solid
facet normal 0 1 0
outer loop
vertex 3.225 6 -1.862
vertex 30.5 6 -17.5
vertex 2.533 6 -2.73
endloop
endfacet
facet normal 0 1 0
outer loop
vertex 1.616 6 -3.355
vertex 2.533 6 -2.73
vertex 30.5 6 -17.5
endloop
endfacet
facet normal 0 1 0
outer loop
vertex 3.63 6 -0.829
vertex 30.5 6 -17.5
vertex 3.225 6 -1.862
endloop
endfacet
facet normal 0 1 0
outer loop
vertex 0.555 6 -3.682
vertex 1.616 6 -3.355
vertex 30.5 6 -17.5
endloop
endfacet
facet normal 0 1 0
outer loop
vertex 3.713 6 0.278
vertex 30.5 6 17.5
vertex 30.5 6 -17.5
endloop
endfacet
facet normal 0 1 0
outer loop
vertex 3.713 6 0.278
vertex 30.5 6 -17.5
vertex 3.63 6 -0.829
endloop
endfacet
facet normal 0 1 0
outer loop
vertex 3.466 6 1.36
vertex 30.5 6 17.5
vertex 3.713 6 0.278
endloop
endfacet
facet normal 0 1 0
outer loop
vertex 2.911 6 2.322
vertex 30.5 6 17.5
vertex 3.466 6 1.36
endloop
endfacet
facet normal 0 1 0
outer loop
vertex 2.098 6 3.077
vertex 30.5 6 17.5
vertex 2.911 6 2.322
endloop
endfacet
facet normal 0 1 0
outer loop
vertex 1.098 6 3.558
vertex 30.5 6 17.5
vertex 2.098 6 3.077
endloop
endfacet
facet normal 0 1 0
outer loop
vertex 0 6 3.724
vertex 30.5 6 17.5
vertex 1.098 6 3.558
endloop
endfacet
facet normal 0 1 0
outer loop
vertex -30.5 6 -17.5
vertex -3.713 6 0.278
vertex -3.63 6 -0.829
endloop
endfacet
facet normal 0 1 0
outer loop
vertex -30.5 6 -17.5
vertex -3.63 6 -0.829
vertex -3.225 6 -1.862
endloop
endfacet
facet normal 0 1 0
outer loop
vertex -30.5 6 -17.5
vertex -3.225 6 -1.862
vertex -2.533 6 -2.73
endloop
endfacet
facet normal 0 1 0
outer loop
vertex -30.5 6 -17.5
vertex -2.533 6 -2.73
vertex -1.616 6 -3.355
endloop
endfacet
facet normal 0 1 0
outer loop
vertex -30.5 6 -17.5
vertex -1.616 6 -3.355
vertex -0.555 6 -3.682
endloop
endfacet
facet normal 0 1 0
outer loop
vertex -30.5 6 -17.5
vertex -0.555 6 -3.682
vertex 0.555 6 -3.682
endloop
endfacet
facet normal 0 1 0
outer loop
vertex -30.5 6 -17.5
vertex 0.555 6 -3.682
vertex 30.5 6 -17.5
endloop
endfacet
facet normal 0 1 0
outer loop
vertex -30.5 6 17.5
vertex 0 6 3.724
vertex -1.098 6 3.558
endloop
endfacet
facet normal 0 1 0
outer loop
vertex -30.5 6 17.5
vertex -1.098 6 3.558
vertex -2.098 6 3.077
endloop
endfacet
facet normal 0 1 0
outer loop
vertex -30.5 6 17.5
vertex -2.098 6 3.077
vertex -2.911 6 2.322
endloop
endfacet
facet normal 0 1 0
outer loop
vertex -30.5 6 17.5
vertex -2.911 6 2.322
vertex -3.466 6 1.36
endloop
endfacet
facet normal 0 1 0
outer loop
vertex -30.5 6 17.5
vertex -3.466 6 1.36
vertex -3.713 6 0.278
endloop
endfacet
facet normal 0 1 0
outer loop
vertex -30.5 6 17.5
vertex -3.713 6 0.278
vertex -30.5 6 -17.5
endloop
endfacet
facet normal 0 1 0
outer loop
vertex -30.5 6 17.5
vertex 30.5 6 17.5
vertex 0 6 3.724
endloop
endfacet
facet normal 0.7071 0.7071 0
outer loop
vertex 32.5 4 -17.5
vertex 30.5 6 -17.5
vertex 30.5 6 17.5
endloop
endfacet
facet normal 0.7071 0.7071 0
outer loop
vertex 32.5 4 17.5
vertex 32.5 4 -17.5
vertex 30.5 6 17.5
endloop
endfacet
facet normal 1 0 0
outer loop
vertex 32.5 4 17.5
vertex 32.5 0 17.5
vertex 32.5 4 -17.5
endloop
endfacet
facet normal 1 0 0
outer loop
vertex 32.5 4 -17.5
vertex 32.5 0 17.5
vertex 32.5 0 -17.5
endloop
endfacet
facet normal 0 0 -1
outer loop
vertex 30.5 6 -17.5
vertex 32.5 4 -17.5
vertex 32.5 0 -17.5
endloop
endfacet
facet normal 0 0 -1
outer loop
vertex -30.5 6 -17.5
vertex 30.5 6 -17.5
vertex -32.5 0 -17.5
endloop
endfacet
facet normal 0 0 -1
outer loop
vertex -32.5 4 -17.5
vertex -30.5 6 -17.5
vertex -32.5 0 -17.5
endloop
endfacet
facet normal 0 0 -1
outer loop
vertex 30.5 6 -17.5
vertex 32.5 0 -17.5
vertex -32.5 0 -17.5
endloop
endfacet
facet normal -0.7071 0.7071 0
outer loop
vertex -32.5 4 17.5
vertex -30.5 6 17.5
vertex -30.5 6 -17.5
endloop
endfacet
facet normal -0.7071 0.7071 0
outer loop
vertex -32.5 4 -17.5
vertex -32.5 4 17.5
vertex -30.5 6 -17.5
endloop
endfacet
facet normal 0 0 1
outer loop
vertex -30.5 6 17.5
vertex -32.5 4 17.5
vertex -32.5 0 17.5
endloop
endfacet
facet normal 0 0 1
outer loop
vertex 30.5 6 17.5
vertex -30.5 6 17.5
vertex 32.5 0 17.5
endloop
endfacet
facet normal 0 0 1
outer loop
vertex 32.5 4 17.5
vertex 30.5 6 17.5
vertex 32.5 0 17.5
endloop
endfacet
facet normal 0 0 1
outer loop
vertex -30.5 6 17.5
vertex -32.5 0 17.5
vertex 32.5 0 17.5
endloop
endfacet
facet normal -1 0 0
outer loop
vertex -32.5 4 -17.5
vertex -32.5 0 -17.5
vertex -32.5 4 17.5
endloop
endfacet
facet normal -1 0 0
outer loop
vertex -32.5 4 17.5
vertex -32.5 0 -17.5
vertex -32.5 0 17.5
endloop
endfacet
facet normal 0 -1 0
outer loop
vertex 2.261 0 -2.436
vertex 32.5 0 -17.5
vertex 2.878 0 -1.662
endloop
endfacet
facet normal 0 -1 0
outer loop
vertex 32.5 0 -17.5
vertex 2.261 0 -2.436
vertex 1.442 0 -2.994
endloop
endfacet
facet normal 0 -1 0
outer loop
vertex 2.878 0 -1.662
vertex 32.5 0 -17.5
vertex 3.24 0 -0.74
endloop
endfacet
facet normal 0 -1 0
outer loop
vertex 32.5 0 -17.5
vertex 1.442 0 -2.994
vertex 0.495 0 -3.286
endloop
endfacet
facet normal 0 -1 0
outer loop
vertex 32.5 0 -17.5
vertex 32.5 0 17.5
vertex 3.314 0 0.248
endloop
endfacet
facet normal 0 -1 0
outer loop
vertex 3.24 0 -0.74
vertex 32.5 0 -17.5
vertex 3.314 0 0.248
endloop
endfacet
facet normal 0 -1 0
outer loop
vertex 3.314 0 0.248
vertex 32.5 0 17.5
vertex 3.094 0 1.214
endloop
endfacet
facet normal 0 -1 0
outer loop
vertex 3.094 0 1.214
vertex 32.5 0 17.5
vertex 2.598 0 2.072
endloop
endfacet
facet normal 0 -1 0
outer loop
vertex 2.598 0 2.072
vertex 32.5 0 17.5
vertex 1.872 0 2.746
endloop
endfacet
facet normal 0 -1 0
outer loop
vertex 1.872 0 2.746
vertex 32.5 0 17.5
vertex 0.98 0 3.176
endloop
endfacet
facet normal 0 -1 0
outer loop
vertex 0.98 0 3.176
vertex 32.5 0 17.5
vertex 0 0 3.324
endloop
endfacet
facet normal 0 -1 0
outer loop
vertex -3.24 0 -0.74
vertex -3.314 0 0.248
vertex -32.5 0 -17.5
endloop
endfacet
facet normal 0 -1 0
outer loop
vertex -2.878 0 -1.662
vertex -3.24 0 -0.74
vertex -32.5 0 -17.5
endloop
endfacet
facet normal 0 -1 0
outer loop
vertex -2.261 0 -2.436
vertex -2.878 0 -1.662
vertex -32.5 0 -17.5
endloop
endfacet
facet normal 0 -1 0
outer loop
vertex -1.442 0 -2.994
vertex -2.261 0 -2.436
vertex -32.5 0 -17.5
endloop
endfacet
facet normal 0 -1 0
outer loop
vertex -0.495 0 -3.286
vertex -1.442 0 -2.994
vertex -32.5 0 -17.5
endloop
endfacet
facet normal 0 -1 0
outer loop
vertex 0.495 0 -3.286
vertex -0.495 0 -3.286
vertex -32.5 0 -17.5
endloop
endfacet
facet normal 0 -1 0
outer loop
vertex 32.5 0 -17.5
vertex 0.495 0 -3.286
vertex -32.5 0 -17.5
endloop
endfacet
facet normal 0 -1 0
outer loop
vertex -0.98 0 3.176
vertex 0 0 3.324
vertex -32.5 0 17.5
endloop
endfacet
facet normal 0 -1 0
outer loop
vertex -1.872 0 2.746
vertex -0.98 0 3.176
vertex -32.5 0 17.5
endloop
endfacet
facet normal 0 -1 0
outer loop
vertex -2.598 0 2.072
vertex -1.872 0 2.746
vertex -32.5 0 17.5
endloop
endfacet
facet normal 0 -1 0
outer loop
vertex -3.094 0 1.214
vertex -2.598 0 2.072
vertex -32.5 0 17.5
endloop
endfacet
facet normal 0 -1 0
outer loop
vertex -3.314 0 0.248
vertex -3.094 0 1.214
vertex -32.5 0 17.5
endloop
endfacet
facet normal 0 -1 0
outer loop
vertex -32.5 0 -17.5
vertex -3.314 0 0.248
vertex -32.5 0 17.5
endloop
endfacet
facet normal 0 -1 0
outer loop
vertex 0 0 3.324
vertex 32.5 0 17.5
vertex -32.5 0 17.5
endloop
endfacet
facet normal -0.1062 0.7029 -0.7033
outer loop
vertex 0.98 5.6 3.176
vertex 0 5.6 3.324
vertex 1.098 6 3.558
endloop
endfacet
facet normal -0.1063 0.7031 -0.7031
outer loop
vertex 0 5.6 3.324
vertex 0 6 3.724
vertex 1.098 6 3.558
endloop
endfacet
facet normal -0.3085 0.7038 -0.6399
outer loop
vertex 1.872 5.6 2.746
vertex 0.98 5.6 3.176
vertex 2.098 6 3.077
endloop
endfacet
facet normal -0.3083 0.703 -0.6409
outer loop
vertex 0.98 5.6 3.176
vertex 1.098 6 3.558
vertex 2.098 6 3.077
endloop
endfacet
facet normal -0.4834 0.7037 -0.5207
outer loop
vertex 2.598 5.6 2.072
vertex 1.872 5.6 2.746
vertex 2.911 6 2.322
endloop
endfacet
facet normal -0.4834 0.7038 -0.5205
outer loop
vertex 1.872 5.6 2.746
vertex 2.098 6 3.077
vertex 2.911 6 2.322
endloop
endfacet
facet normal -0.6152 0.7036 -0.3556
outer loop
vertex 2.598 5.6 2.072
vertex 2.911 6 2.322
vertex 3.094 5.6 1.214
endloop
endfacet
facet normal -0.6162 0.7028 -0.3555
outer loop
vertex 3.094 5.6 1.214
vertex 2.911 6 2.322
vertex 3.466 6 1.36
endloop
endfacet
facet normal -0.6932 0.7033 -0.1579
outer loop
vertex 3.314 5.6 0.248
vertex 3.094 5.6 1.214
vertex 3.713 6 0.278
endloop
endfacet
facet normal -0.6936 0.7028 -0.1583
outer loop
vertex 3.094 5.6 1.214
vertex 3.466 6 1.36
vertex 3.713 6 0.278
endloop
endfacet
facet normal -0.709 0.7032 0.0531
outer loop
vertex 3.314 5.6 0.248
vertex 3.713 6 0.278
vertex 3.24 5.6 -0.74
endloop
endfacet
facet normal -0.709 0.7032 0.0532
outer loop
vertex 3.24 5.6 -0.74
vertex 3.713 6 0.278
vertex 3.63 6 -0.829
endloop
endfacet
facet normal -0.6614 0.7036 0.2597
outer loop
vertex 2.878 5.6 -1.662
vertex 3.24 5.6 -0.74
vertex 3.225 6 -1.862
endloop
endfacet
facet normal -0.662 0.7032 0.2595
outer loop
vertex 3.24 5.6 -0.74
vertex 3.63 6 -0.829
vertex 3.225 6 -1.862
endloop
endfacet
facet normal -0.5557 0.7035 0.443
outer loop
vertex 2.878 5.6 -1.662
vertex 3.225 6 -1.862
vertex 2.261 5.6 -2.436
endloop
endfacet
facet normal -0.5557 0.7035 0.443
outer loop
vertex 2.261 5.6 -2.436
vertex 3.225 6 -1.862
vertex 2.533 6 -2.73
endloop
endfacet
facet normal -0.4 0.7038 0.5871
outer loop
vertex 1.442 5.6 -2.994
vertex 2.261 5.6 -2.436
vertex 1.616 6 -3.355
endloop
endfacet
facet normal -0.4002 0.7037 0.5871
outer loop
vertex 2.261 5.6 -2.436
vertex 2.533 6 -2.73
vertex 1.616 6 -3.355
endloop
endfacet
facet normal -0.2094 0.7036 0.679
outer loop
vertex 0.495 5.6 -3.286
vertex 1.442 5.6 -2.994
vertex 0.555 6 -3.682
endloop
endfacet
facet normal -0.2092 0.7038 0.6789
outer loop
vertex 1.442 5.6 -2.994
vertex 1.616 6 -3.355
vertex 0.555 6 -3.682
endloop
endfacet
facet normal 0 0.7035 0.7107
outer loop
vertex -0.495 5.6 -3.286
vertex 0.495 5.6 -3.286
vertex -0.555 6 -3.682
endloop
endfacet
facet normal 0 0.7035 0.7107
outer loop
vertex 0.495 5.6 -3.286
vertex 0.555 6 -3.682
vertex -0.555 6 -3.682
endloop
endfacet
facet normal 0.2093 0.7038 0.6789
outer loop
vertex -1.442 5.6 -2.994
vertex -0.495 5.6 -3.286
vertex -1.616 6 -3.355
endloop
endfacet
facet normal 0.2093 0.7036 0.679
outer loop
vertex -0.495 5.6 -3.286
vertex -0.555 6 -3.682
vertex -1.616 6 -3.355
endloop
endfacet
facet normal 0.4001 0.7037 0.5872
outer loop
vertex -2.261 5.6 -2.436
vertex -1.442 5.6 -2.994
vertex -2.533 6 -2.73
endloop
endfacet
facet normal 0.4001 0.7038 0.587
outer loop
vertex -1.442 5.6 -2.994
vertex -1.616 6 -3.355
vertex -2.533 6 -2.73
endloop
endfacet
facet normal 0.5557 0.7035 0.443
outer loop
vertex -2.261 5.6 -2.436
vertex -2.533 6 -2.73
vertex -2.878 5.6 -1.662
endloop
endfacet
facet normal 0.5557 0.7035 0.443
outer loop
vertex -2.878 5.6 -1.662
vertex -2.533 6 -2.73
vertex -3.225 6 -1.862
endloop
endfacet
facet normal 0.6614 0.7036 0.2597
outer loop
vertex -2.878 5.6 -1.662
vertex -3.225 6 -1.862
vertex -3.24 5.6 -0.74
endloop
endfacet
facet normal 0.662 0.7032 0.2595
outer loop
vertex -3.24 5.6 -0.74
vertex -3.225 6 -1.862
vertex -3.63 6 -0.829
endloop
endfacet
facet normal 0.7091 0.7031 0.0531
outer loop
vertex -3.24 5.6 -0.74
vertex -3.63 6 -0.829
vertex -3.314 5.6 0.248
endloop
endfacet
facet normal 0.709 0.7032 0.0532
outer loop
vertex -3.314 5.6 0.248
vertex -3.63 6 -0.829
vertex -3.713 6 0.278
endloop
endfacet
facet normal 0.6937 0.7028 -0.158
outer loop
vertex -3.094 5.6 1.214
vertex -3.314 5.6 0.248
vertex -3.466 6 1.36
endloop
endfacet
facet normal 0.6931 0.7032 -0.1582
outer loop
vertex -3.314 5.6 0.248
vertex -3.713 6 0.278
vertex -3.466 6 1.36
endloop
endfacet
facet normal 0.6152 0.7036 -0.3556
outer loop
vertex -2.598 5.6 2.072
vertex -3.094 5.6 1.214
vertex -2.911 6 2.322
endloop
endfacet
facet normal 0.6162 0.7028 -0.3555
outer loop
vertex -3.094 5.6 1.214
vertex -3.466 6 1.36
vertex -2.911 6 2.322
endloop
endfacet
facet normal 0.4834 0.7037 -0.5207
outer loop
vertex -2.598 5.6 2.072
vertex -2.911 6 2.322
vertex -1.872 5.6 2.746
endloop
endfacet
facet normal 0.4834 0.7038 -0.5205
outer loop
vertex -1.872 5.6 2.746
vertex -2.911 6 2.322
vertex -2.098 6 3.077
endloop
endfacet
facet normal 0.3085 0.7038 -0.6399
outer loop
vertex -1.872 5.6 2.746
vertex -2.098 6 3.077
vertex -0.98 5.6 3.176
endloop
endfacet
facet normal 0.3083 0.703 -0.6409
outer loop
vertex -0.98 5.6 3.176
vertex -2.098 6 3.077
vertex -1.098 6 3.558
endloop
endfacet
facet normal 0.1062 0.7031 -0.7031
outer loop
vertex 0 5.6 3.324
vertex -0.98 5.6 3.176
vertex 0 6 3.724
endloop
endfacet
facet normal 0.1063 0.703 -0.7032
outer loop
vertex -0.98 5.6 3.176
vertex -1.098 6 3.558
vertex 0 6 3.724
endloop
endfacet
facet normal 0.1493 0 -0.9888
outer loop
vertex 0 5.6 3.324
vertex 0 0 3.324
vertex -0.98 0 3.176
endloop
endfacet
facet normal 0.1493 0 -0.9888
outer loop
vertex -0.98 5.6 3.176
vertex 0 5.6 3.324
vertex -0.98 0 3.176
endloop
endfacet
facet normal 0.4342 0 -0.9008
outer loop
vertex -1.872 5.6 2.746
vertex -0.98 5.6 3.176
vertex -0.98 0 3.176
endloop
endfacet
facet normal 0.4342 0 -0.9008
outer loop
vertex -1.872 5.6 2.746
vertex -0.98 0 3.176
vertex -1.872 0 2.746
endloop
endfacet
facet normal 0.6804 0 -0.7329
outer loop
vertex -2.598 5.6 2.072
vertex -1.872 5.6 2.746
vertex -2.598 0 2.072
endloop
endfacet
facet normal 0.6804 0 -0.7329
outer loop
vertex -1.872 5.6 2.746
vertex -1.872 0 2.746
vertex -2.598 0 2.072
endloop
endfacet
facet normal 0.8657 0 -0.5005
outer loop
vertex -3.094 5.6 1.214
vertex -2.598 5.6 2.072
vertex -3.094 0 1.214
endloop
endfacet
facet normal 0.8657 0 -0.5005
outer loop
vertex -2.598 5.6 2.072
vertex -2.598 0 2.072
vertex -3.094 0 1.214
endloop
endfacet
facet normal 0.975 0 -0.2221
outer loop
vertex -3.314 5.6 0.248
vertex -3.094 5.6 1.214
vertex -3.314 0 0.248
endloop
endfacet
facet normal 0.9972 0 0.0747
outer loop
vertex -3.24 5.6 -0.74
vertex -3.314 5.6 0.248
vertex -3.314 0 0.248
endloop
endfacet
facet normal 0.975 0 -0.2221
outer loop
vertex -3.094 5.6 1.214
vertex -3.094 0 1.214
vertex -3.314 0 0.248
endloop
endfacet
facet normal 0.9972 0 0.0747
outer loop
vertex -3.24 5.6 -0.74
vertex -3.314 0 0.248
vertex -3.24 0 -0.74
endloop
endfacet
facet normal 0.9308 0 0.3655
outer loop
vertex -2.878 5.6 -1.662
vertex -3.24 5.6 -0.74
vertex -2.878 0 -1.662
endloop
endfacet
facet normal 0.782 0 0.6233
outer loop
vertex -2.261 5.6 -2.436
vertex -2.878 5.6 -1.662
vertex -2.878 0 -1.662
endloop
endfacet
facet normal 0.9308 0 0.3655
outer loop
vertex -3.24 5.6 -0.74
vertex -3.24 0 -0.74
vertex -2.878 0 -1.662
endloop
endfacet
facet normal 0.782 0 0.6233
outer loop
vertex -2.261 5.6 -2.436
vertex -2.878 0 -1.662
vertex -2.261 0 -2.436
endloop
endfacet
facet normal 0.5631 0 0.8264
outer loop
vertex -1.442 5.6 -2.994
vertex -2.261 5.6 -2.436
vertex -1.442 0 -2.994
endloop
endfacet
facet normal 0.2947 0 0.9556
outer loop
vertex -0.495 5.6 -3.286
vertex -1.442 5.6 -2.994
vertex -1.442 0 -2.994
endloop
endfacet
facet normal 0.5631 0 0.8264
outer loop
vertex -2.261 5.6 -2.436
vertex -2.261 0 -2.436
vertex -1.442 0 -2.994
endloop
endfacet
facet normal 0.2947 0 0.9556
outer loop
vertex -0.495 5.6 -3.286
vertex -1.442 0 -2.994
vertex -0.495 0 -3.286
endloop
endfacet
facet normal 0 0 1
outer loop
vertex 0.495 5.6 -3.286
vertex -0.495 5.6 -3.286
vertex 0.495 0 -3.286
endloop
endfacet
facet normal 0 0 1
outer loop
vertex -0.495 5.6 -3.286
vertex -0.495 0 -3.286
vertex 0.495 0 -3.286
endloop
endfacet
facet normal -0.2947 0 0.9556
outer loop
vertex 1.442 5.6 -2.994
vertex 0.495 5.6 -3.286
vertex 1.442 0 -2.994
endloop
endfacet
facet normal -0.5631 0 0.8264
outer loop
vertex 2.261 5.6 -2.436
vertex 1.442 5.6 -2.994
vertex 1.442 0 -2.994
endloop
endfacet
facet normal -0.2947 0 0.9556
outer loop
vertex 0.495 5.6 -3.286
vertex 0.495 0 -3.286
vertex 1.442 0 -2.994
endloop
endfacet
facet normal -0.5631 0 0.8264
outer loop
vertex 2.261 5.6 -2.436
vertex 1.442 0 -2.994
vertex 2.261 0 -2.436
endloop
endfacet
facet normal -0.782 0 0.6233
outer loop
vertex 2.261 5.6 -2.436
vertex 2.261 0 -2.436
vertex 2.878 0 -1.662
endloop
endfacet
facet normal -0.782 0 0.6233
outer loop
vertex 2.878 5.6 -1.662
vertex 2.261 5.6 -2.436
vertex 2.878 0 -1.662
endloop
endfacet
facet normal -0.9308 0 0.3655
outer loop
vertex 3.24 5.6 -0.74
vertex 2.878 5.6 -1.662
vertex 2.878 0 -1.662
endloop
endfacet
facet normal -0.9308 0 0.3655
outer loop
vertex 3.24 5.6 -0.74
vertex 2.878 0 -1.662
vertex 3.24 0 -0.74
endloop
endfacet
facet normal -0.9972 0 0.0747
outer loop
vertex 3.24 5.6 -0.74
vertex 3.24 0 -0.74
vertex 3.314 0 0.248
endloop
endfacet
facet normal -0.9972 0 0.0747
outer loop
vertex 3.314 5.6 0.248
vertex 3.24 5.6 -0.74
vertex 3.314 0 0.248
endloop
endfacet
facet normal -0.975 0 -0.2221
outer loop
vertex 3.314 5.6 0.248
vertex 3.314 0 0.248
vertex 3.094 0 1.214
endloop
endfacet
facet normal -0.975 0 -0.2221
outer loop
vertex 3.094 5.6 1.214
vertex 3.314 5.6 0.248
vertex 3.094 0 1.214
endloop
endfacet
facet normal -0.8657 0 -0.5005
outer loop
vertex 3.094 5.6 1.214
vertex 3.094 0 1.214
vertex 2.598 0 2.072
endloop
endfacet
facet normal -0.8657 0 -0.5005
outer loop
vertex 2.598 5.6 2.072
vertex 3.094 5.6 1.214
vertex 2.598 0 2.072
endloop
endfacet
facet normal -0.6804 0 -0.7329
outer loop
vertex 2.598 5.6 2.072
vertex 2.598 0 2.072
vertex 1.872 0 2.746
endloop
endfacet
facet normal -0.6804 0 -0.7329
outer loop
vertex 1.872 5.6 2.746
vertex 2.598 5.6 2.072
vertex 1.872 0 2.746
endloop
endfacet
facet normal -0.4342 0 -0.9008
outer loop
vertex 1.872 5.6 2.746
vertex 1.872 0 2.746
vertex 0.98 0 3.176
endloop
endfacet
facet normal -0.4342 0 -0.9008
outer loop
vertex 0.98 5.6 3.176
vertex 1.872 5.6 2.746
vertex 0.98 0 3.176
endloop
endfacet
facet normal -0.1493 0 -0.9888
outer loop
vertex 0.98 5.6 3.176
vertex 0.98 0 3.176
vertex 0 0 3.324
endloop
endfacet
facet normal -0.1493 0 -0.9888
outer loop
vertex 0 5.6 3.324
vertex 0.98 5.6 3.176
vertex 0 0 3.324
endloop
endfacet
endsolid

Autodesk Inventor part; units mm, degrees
ref_plane "YZ Plane" through (0, 0, 0) normal (1, 0, 0) x (0, 1, 0)
ref_plane "XZ Plane" through (0, 0, 0) normal (0, 1, 0) x (-1, 0, 0)
ref_plane "XY Plane" through (0, 0, 0) normal (0, 0, 1) x (1, 0, 0)
sketch "Náčrt2" plane through (0, 0, 0) normal (0, 1, 0) x (-1, 0, 0)
  line L0 (32.5, 17.5) -> (-32.5, 17.5)
  line L1 (-32.5, 17.5) -> (-32.5, -17.5)
  line L2 (-32.5, -17.5) -> (32.5, -17.5)
  line L3 (32.5, -17.5) -> (32.5, 17.5)
  point P0 (0, 0)
  point P1 (32.5, 0)
  point P2 (0, 17.5)
  dimension "d0" = 65
  dimension "d1" = 35
extrude "Vysunutí1" add sketch "Náčrt2" along normal blind 6
chamfer "Zkosení3" distance 2 angle 45 2 edges at (-32.5, 6, 0) (32.5, 6, 0)
sketch "Náčrt6" plane through (0, 6, 0) normal (0, 1, 0) x (1, 0, 0)
  point P0 (0, 0)
hole "Díra1" at (0, 6, 0) direction (0, -1, 0) diameter 6.647 end through all thread size "M8x1.25" class "6H" standard "ISO Metric profile"
chamfer "Zkosení4" distance 0.4 angle 45 1 edges at (0, 6, -3.3235)
equation "\"PoloměrOhybu\" = Tloušťka"
equation "\"ŠířkaVýštipu\" = Tloušťka"
equation "\"HloubkaVýštipu\" = 0.5 * Tloušťka"
equation "\"MinimálníZbytek\" = 2 * Tloušťka"
equation "\"PřechodovýPoloměr\" = PoloměrOhybu"
equation "\"VelikostJacobihoPoloměru\" = PoloměrOhybu"
equation "\"VelikostMezery\" = Tloušťka"
equation "\"Tloušťka\" = 2.5"
properties part number "DD_KVD_004_04_B" material "Nerezová ocel"
